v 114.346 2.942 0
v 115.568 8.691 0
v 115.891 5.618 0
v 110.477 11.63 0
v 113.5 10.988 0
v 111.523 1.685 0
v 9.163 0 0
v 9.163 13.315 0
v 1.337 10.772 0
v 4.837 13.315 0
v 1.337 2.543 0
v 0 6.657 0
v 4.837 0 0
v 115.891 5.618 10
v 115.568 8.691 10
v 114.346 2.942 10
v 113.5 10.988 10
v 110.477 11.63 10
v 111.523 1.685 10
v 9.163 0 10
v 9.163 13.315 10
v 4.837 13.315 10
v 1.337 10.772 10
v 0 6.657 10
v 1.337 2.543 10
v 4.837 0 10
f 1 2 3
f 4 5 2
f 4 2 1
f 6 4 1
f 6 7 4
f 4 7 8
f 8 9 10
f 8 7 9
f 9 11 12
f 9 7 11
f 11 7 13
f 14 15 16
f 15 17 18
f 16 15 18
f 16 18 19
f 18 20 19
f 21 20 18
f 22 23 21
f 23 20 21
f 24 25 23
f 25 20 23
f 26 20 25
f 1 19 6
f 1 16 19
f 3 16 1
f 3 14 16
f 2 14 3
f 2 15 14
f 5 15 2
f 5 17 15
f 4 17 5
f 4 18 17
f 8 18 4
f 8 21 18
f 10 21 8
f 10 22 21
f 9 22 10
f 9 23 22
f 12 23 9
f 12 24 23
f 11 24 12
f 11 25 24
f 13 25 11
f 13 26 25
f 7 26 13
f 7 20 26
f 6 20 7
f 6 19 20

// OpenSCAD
$fn = 32;

// ----------------------------------------------------------------------
// Lever arm: two bosses 14 and 10 mm, 65 mm between centres
// ----------------------------------------------------------------------

// --- parameters (mm) ---
profile_height = 10;      // extrusion height
profile_points = 13;      // points of the closed outline

profile = [[0, 6.657], [1.337, 2.543], [4.837, 0], [9.163, 0], [111.523, 1.685], [114.346, 2.942], [115.891, 5.618], [115.568, 8.691], [113.5, 10.988], [110.477, 11.63], [9.163, 13.315], [4.837, 13.315], [1.337, 10.772]];  // single closed polygon, 13 points, counter clockwise

// --- the one profile operation ---
linear_extrude(height = profile_height) polygon(points = profile);
